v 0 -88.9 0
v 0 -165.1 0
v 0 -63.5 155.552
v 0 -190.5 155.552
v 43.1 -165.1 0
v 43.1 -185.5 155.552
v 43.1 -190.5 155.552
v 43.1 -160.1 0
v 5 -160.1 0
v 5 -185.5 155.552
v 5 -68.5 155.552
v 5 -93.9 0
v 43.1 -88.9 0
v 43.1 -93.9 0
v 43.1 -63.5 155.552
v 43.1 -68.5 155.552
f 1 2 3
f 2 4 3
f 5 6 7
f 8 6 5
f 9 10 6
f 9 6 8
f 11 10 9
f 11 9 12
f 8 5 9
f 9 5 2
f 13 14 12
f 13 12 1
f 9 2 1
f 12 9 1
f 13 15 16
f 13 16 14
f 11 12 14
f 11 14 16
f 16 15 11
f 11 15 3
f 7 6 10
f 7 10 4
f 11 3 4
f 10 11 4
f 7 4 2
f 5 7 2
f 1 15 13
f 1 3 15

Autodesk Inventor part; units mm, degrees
ref_plane "YZ Plane" through (0, 0, 0) normal (1, 0, 0) x (0, 1, 0)
ref_plane "XZ Plane" through (0, 0, 0) normal (0, 1, 0) x (-1, 0, 0)
ref_plane "XY Plane" through (0, 0, 0) normal (0, 0, 1) x (1, 0, 0)
sketch "Sketch3" plane through (0, 0, 0) normal (1, 0, 0) x (0, 1, 0)
  line L0 (0, 155.5521) -> (-254, 155.5521)
  line L1 (-254, 155.5521) -> (-254, 0)
  line L2 (-254, 0) -> (0, 0)
  line L3 (0, 0) -> (0, 155.5521)
  dimension "d0" = 254
extrude "Extrusion1" add sketch "Sketch3" along normal blind 5
sketch "Sketch4" plane through (0, 0, 0) normal (-1, 0, 0) x (0, 0, 1)
  line L0 (155.5521, 0) -> (155.5521, -254) construction
  line L1 (0, 0) -> (155.5521, 0) projected
  line L2 (0, -254) -> (0, 0) construction
  line L3 (155.5521, -254) -> (0, -254) projected
  line L4 (0, 0) -> (0, -88.9)
  line L5 (0, -254) -> (0, 0) projected
  line L6 (155.5521, 0) -> (0, 0)
  line L7 (155.5521, -254) -> (0, -254)
  line L8 (0, -254) -> (0, -165.1)
  line L9 (155.5521, -254) -> (155.5521, -190.5)
  line L10 (155.5521, 0) -> (155.5521, -254) projected
  line L11 (155.5521, -190.5) -> (0, -165.1)
  line L12 (155.5521, 0) -> (155.5521, -63.5)
  line L13 (155.5521, -63.5) -> (0, -88.9)
  dimension "d3" = 88.9
  dimension "d4" = 88.9
  dimension "d5" = 63.5
  dimension "d7" = 63.5
  dimension "d10" = 155.5521
extrude "Extrusion2" cut sketch "Sketch4" against normal through all contours L1 L10 L13 L4 | L11 L9 L3 L5
sketch "Sketch7" plane through (5, 0, 0) normal (1, 0, 0) x (0, 0, -1)
  line L0 (-155.5521, -190.5) -> (0, -165.1) projected
  line L1 (0, -165.1) -> (0, -88.9) projected
  line L2 (0, -88.9) -> (-155.5521, -63.5) projected
  line L3 (-155.5521, -63.5) -> (-155.5521, -190.5) projected
  line L4 (0, -88.9) -> (-155.5521, -63.5)
  line L5 (-155.5521, -63.5) -> (-155.5521, -68.5)
  line L6 (-155.5521, -63.5) -> (-155.5521, -190.5) projected
  line L7 (0, -88.9) -> (0, -93.9)
  line L8 (0, -165.1) -> (0, -88.9) projected
  line L9 (0, -93.9) -> (-155.5521, -68.5)
  line L10 (-155.5521, -190.5) -> (-155.5521, -185.5)
  line L11 (-155.5521, -185.5) -> (0, -160.1)
  line L12 (0, -165.1) -> (-154.7568, -190.3701)
  line L13 (0, -165.1) -> (-155.5521, -190.5) projected
  point P0 (0, 0)
  dimension "d14" = 5
  dimension "d15" = 5
extrude "Extrusion3" add sketch "Sketch7" along normal blind 38.1 contours L3 L11 L1 L0 | L3 L2 L1 L9
